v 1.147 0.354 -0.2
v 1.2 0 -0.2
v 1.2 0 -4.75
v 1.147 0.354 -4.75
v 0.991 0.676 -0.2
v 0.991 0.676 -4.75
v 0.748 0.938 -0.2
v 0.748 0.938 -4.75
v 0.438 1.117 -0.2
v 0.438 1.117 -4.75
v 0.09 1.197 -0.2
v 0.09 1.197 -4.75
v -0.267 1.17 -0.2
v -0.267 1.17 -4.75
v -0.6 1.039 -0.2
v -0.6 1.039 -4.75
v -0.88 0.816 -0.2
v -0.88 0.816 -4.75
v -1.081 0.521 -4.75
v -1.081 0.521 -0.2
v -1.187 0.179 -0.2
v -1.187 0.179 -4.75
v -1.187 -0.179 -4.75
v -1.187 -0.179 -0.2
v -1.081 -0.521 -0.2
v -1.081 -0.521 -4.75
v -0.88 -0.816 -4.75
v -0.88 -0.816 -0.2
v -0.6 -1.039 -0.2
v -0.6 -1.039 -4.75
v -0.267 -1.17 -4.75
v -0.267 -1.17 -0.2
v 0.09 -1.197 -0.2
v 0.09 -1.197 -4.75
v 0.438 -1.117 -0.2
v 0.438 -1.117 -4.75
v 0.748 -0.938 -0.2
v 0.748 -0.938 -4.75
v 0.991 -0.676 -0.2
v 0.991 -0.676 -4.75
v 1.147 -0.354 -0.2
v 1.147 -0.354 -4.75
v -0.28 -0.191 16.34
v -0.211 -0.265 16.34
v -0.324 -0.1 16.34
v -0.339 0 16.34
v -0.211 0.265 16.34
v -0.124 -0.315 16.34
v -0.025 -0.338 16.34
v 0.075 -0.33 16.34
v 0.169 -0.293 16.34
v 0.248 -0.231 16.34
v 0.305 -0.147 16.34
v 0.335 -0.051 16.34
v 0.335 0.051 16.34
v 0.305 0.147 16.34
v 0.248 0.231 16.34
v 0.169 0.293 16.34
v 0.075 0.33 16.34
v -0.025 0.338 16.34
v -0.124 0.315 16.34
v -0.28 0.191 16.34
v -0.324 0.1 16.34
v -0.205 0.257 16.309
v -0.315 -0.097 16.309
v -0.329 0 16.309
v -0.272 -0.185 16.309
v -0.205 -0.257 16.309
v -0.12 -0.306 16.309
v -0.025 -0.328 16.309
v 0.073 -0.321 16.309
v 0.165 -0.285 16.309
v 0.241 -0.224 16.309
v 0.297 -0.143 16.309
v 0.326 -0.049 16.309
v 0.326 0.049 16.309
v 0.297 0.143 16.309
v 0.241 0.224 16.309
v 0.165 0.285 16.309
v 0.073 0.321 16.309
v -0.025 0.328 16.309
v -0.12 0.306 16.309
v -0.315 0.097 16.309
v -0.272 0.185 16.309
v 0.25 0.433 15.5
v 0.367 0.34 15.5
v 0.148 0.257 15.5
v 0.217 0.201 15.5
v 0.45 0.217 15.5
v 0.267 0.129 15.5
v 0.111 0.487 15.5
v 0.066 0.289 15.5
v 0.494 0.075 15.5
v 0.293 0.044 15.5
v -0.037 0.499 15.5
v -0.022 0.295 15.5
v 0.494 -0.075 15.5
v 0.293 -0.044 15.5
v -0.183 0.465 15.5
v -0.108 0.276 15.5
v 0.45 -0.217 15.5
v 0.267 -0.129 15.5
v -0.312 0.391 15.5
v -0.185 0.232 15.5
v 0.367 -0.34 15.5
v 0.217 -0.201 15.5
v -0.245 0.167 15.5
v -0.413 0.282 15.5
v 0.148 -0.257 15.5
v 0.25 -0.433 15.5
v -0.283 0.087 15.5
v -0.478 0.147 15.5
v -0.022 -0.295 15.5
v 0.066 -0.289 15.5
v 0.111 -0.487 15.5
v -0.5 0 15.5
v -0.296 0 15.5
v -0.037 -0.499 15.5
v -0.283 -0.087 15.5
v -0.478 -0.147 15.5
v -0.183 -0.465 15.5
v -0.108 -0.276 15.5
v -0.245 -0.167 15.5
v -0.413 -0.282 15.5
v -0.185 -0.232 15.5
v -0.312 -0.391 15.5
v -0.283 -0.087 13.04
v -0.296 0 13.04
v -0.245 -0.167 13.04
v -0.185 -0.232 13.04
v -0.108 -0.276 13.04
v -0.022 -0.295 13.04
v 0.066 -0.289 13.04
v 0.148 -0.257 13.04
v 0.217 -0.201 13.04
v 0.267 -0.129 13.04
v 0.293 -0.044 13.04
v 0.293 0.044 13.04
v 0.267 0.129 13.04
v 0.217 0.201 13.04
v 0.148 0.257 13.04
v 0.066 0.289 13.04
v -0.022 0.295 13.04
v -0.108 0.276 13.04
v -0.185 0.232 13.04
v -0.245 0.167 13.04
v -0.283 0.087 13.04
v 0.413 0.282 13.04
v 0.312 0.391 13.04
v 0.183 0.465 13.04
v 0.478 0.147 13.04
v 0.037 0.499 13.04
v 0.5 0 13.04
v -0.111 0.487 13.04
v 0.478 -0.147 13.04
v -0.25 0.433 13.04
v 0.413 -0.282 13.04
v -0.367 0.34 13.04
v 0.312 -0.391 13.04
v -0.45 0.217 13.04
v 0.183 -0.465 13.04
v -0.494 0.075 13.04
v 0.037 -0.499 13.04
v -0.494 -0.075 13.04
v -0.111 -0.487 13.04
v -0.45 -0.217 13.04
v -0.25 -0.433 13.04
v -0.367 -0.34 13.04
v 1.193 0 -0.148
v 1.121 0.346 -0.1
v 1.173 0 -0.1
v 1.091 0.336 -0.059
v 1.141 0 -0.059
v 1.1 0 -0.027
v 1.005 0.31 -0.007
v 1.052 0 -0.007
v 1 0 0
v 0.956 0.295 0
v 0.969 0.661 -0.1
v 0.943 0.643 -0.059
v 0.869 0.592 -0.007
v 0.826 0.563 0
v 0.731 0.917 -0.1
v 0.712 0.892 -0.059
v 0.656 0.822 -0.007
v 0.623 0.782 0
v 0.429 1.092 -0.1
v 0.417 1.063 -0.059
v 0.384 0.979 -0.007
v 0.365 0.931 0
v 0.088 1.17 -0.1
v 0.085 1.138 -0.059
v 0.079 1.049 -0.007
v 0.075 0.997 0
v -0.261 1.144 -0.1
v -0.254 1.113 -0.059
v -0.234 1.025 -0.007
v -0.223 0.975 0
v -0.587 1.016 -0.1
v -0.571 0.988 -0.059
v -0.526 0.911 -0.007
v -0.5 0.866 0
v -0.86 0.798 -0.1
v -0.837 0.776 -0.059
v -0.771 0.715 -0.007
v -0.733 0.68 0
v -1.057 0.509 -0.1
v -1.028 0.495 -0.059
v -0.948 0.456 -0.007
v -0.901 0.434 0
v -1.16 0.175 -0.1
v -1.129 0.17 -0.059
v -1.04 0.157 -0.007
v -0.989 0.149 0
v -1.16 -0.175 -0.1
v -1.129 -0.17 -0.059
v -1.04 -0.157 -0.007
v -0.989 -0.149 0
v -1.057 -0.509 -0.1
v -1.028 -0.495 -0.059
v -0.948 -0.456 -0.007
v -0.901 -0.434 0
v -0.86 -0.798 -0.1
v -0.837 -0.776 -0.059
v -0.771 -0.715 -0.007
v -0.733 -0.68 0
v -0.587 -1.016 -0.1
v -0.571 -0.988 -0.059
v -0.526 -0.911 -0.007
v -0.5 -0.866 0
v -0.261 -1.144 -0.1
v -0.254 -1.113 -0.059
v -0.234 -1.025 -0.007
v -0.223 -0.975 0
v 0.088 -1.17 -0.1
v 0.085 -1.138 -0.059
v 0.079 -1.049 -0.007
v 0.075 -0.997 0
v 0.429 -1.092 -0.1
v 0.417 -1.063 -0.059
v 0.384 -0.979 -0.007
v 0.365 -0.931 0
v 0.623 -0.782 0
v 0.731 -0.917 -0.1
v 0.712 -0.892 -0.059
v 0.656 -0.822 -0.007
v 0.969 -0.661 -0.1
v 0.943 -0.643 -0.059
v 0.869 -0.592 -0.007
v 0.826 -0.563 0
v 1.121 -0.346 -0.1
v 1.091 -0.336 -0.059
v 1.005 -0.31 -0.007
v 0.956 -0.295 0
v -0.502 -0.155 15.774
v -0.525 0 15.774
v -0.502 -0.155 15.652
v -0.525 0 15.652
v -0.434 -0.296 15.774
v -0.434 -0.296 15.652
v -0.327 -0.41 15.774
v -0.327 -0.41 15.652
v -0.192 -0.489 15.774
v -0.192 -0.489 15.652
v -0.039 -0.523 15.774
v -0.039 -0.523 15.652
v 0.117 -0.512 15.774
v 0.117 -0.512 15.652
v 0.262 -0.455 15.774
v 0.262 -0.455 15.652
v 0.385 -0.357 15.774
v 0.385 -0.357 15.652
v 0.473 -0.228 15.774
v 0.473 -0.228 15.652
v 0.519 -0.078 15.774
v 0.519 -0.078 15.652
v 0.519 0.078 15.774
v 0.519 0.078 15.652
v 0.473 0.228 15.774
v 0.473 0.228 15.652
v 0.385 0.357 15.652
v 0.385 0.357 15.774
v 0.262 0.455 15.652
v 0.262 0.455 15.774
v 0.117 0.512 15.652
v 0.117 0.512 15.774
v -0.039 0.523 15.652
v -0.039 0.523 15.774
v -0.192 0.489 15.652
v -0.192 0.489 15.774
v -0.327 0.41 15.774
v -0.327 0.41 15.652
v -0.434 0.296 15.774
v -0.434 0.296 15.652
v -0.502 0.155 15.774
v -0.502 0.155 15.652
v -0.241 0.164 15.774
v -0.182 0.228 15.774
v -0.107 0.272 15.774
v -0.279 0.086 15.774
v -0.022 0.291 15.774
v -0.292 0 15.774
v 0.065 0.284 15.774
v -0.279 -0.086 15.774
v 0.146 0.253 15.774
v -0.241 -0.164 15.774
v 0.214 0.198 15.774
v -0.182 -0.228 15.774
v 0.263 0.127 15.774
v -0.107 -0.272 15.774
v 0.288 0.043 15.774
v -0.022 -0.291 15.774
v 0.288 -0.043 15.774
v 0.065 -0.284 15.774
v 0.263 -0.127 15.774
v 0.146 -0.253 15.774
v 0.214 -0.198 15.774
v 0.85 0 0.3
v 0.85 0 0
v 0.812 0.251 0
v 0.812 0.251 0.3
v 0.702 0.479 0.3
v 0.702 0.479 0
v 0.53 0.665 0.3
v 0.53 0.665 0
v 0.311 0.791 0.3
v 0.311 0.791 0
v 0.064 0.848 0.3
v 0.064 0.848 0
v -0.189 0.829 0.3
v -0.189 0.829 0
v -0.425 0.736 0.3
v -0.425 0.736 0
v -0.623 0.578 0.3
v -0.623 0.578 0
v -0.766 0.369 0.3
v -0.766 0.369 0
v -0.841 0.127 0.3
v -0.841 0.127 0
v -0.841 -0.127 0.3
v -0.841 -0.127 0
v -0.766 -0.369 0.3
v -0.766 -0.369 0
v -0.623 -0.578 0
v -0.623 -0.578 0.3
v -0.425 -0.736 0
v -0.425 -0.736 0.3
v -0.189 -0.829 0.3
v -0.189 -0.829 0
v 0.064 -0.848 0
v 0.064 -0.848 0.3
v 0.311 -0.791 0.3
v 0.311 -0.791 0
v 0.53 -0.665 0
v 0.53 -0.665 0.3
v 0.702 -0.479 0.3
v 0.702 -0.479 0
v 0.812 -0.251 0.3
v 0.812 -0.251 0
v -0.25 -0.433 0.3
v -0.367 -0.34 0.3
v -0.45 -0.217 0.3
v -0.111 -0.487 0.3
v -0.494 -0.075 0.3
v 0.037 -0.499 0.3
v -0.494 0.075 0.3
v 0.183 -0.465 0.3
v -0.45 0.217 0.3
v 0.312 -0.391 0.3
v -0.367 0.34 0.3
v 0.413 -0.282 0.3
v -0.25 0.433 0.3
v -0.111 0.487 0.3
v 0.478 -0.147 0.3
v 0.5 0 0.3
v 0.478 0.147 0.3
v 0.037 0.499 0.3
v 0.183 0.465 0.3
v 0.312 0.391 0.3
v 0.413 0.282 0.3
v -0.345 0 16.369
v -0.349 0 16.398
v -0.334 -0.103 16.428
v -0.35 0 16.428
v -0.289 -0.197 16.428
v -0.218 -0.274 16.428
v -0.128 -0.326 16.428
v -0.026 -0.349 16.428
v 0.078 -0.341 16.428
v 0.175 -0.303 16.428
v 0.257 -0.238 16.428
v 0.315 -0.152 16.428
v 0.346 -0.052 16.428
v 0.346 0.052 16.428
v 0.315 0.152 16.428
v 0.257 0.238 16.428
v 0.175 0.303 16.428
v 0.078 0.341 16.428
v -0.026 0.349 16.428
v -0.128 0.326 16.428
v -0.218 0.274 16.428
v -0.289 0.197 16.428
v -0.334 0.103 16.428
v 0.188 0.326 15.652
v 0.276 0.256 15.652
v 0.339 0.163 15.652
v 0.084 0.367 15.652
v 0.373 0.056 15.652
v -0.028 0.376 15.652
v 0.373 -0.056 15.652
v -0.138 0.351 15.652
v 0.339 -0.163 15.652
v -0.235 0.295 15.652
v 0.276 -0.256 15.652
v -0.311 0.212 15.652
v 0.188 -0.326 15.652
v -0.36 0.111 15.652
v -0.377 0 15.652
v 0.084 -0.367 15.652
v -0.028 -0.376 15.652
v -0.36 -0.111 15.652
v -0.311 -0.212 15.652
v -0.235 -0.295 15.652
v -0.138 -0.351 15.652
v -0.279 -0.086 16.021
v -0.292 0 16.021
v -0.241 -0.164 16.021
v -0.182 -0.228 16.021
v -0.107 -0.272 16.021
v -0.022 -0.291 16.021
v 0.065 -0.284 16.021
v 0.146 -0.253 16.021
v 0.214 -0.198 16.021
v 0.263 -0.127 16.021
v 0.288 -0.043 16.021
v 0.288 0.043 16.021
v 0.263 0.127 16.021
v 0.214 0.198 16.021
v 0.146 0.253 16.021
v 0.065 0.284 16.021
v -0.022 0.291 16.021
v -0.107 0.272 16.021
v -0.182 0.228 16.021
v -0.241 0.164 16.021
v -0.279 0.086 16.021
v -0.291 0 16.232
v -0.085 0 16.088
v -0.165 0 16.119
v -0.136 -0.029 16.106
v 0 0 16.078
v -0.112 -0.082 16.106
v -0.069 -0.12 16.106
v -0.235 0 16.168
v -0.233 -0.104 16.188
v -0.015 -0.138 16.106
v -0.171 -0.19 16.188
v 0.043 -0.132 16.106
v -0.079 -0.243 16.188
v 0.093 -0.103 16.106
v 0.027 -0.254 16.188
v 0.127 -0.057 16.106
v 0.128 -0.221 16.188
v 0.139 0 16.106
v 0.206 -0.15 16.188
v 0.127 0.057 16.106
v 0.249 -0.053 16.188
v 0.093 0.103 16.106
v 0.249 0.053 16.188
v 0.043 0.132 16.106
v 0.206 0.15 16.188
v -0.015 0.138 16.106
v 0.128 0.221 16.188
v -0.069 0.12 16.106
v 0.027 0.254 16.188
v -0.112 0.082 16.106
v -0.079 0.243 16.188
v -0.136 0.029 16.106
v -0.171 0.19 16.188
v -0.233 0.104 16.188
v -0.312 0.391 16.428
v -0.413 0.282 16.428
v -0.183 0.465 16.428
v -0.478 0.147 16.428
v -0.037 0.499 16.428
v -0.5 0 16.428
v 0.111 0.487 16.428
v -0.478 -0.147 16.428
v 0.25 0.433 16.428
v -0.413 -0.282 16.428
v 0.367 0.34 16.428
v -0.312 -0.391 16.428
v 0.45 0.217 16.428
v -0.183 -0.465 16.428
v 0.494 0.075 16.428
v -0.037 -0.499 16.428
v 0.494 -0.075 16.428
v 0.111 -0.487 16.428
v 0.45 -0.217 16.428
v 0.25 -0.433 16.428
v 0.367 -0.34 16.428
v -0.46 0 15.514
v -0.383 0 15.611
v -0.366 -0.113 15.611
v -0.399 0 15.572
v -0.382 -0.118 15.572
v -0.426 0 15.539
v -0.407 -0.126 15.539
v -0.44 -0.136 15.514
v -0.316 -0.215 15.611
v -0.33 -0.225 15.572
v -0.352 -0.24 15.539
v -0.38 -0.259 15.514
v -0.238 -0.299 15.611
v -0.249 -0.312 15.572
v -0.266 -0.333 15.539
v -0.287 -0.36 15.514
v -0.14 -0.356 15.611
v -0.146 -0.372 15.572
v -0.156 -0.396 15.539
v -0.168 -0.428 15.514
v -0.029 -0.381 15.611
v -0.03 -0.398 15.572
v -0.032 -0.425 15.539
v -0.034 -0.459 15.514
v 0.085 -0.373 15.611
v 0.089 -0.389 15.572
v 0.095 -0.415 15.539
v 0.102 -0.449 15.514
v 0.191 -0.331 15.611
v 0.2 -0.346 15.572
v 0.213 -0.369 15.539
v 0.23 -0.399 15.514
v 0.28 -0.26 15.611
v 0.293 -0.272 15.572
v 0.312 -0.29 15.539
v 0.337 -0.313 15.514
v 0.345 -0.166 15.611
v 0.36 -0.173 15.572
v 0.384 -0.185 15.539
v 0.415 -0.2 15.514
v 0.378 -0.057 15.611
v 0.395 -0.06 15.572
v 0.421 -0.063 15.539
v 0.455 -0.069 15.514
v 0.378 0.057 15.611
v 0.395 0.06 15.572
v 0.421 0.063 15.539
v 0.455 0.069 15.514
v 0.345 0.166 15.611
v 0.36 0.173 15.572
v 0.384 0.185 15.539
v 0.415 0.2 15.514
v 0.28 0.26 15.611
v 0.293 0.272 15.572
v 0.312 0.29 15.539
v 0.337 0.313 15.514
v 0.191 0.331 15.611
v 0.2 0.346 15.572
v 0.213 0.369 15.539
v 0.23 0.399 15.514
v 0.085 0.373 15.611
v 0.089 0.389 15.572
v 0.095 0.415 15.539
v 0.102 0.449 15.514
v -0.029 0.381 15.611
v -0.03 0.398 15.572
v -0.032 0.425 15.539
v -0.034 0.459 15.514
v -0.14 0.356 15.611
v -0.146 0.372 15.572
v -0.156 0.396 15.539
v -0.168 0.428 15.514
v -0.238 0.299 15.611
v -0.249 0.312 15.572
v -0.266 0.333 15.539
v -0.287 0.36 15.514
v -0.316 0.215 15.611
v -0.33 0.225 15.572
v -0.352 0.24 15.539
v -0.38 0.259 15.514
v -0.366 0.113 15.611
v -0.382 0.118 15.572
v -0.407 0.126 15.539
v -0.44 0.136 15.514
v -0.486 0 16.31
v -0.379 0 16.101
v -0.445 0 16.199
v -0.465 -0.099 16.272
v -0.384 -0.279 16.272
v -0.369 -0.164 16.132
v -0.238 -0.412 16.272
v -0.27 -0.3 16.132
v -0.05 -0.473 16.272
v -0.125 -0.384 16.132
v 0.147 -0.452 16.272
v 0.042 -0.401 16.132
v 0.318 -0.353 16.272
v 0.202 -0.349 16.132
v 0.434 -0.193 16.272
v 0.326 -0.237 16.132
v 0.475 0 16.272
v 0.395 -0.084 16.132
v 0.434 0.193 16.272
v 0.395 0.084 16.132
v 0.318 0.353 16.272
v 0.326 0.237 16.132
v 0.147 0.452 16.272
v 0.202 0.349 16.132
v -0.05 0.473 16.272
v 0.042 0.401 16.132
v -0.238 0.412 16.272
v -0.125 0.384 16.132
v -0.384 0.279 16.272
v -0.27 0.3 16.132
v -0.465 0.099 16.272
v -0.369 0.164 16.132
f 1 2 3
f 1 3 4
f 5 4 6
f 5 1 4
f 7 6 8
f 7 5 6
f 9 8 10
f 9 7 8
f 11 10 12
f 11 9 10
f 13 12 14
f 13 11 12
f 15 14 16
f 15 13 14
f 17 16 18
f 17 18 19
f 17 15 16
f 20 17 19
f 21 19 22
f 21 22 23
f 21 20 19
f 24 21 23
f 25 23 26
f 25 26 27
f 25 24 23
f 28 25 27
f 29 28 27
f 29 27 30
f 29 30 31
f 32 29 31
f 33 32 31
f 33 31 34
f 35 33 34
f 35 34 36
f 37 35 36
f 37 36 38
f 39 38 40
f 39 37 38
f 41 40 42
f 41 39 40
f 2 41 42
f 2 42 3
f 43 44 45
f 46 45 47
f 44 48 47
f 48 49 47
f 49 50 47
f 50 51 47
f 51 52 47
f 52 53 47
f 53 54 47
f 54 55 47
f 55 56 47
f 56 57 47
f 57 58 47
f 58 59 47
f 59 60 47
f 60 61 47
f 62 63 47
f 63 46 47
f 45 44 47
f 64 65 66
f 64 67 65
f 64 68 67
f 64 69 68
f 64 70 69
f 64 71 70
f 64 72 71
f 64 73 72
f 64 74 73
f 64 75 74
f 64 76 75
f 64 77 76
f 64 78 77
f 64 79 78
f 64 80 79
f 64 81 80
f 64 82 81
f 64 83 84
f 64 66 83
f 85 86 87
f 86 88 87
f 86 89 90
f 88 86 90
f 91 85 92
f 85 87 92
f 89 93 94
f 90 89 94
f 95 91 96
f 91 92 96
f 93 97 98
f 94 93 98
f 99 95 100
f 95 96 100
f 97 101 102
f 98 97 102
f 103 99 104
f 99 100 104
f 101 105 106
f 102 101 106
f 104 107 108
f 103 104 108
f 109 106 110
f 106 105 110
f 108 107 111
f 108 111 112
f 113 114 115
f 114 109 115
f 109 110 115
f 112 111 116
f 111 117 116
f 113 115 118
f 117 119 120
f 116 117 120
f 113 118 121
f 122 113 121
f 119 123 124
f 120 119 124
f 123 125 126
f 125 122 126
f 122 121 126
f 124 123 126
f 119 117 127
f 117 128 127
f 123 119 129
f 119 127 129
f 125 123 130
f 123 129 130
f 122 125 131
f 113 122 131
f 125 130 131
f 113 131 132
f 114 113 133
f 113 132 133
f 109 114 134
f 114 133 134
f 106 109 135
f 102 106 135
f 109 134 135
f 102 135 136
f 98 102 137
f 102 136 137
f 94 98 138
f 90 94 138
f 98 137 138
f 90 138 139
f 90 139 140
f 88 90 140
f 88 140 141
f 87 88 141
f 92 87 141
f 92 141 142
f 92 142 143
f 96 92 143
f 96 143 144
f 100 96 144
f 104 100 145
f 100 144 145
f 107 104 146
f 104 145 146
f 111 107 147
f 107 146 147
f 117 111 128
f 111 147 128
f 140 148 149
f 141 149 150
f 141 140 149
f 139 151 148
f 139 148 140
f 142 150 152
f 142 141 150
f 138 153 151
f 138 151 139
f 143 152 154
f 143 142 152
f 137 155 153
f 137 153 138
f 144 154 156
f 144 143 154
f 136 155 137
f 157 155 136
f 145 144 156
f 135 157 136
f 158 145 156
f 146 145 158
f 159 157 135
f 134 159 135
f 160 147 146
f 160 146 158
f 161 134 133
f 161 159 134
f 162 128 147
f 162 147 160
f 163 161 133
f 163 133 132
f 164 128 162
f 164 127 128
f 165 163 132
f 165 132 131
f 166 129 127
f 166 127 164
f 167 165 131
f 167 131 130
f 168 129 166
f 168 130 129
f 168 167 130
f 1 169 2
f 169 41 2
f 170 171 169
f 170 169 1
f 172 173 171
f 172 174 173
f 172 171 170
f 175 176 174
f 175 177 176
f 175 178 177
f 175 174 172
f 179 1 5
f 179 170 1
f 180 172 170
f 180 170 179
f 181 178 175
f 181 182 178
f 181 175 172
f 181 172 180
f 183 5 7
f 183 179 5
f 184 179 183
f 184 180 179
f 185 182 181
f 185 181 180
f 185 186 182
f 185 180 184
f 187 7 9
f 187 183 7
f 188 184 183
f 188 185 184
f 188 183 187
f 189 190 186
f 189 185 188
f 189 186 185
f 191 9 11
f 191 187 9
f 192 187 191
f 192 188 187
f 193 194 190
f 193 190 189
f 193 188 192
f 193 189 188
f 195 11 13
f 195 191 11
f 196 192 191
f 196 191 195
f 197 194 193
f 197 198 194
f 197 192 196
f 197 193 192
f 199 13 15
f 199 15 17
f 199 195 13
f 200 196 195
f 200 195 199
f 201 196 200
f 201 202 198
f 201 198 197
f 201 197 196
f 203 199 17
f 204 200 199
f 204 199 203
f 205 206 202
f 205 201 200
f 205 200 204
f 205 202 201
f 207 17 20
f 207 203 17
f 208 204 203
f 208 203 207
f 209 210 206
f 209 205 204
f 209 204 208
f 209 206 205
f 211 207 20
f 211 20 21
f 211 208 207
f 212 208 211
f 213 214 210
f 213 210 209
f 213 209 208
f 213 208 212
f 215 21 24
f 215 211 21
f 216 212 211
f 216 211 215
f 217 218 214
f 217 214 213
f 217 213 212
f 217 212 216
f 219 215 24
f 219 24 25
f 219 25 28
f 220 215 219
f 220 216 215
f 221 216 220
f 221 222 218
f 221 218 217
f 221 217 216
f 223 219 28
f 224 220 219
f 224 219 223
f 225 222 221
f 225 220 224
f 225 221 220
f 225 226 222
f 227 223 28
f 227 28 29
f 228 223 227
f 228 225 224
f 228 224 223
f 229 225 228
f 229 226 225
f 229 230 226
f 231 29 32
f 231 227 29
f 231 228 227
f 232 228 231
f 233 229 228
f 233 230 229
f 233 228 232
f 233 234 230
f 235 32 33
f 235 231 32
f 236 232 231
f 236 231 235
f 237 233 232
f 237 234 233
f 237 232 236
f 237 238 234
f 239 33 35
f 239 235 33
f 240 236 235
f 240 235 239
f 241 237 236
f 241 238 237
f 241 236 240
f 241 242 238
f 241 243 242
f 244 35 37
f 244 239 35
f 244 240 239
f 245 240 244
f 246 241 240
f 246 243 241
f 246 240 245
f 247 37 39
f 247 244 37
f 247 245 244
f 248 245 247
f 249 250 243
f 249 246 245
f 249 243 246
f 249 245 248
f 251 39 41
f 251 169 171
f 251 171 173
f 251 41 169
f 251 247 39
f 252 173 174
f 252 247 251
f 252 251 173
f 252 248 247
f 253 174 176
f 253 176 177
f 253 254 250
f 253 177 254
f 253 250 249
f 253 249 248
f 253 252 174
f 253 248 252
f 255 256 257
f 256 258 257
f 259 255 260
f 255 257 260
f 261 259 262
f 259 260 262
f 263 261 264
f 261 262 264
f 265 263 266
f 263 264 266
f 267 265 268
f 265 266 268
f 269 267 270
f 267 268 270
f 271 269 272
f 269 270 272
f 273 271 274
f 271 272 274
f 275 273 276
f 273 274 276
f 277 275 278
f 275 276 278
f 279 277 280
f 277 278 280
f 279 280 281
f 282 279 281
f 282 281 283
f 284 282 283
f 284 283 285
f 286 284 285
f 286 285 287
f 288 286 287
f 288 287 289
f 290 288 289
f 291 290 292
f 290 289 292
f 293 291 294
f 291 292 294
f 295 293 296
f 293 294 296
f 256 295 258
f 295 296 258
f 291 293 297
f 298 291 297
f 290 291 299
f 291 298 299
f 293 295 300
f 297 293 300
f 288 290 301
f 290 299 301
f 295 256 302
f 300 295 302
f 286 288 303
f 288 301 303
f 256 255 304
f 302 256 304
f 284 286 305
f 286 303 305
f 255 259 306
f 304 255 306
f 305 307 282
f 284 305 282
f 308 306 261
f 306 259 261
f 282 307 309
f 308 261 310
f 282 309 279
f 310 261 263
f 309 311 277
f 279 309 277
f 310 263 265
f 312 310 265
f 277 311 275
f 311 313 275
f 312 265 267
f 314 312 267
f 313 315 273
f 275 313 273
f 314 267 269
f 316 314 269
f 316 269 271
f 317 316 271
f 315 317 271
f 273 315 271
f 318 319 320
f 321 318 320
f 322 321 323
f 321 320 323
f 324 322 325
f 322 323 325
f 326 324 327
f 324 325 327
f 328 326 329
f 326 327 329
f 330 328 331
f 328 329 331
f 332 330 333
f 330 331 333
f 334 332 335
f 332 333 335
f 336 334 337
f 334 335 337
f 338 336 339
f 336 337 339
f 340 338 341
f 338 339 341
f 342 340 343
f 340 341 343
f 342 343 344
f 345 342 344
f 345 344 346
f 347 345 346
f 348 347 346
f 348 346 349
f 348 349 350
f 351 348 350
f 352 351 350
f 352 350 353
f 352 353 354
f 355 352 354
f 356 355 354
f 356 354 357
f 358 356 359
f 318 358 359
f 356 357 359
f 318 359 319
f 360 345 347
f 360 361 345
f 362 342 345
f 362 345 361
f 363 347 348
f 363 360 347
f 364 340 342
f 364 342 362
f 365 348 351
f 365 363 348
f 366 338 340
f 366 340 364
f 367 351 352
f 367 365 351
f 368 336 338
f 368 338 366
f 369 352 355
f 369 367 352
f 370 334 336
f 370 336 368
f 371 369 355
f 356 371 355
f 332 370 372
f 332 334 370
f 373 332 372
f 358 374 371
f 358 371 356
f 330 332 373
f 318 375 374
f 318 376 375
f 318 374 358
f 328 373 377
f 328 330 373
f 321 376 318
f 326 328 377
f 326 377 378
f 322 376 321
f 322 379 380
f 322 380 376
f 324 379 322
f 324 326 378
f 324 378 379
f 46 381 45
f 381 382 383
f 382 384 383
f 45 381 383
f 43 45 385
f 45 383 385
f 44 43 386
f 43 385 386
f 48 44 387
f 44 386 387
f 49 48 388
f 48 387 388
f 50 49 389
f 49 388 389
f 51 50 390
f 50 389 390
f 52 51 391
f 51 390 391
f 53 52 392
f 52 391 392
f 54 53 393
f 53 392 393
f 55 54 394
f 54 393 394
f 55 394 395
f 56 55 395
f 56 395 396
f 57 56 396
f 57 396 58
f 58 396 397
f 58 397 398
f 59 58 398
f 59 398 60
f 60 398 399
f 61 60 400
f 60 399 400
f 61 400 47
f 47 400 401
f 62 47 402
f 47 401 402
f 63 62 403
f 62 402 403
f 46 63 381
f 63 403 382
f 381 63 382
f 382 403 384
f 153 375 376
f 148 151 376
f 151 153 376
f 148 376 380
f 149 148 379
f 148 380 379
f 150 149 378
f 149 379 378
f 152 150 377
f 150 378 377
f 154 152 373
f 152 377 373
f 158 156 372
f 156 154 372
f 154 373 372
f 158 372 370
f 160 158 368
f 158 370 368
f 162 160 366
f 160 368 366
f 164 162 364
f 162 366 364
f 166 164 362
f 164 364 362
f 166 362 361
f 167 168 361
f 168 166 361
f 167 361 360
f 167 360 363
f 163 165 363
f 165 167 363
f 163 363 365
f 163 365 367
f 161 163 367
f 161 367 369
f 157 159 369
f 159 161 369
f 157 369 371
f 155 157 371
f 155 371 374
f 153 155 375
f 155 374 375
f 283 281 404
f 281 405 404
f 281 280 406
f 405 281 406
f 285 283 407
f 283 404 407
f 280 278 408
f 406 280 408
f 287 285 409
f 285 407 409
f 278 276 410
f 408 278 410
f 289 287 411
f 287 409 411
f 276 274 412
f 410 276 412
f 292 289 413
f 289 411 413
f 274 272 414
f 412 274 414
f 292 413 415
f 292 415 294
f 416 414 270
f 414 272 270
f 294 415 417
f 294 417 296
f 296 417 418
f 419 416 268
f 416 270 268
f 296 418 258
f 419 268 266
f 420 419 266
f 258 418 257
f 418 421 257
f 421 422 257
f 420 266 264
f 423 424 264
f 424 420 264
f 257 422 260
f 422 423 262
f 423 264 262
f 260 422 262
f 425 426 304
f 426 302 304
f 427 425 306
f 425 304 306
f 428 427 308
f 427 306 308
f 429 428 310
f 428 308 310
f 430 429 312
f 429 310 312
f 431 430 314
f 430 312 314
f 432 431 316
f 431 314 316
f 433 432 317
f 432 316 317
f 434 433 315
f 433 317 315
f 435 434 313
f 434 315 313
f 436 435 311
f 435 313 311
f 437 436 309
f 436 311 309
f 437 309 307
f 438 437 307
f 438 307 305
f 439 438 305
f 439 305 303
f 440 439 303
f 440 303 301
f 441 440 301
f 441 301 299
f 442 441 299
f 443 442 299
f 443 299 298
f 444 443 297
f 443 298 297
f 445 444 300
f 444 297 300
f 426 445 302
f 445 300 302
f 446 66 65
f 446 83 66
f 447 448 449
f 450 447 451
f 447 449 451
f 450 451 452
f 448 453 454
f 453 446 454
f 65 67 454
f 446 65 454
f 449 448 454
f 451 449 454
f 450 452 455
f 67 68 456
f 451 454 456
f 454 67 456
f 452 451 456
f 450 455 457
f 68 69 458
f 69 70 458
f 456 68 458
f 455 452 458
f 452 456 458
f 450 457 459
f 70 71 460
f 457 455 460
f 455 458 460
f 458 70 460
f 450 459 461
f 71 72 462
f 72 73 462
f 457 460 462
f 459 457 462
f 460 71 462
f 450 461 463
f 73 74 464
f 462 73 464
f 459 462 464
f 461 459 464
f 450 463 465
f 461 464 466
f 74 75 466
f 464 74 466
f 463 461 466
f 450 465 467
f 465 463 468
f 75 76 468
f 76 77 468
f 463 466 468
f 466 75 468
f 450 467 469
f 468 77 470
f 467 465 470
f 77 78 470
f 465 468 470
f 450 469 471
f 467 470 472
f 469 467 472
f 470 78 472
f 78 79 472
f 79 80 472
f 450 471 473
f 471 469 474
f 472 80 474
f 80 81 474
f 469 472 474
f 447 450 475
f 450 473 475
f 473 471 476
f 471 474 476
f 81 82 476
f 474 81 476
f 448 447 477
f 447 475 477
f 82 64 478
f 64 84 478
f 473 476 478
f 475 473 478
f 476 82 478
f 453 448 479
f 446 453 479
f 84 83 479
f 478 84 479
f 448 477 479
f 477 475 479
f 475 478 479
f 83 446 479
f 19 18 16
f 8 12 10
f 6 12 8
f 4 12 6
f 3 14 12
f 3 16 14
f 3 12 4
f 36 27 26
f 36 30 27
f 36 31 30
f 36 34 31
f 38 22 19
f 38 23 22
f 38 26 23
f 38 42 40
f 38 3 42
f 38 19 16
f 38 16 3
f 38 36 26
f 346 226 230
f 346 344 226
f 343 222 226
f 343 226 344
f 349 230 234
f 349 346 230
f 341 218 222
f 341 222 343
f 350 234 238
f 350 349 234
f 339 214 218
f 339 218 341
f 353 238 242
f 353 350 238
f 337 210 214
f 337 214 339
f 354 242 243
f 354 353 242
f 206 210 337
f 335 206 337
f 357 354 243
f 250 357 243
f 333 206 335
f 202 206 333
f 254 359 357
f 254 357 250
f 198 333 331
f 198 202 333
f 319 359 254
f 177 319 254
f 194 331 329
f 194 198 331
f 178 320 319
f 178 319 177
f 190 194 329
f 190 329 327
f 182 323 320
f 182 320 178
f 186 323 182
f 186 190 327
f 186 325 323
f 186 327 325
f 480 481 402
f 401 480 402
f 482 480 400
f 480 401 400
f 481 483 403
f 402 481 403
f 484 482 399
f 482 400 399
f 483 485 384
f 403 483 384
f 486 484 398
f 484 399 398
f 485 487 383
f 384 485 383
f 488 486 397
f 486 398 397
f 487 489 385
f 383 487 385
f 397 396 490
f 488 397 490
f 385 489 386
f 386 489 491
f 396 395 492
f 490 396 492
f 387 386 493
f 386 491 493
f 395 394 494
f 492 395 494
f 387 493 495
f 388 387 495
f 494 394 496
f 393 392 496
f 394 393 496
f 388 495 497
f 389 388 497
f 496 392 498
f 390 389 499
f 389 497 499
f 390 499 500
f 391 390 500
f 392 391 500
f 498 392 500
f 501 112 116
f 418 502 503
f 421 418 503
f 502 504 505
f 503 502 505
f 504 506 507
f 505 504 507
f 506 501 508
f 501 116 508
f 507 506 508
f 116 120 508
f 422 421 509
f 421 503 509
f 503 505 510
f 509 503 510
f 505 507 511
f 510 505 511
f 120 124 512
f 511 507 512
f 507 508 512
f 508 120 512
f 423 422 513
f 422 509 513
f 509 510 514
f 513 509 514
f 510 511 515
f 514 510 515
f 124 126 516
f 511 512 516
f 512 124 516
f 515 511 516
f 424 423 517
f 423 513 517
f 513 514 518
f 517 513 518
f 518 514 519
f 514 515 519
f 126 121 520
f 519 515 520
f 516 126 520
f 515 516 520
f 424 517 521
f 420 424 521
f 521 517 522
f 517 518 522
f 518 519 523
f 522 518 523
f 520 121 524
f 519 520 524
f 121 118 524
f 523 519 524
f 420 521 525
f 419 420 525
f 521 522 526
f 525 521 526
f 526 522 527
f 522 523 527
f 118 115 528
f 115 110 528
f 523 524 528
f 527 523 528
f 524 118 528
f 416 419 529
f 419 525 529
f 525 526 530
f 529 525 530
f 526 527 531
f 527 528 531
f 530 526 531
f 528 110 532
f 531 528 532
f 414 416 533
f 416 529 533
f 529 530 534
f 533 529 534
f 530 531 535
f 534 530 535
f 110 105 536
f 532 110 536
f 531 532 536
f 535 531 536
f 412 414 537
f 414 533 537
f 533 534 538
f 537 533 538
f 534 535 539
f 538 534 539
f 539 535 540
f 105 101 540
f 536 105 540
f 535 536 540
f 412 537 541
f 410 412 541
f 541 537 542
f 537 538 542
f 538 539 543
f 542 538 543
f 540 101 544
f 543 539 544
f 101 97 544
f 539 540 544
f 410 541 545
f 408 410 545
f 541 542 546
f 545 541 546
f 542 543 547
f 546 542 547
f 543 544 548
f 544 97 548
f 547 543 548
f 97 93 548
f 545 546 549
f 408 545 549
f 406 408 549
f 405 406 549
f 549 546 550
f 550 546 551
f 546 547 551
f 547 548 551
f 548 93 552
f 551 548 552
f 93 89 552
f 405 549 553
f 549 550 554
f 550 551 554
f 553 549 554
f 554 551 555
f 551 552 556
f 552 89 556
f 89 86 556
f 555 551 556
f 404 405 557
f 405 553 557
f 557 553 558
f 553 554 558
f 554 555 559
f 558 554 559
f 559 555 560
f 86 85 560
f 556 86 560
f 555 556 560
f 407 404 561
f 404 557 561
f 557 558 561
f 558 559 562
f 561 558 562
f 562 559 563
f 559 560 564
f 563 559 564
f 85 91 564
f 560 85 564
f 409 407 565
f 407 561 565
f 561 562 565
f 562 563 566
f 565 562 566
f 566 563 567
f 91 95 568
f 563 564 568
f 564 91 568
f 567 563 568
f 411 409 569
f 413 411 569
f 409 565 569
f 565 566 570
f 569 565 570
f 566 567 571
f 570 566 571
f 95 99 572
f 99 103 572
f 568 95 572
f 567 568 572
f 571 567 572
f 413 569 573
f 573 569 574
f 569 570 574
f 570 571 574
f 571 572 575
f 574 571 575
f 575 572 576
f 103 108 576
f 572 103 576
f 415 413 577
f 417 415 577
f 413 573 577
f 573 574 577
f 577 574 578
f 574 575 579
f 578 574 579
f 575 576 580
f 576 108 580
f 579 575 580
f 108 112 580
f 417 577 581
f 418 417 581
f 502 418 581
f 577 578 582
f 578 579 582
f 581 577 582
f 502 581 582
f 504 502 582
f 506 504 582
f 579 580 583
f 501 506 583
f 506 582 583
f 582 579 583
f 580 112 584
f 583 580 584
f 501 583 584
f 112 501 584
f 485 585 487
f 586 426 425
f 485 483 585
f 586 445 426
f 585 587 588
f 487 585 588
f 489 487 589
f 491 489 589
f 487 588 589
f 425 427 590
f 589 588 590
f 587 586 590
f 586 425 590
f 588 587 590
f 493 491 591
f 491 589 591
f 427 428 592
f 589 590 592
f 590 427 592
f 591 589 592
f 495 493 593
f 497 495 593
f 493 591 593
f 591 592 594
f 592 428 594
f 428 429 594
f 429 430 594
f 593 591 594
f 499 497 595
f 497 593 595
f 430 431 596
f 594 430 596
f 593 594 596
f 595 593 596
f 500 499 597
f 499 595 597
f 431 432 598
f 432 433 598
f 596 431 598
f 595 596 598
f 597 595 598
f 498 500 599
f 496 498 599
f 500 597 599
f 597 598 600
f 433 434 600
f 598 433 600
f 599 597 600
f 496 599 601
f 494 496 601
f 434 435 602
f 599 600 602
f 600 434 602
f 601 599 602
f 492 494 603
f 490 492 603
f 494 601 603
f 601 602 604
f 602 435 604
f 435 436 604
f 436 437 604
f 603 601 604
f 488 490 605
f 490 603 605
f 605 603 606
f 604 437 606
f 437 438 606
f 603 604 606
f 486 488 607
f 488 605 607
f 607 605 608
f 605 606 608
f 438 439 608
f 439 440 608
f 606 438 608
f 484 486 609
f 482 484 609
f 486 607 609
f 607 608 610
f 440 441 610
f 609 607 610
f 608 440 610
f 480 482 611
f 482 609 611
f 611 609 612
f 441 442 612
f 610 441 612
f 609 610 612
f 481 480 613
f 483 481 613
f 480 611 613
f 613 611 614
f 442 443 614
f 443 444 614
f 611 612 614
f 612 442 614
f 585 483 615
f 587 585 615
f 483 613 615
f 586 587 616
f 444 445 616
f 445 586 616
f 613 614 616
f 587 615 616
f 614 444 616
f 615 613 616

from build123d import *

# Parameters (mm, degrees)
SKETCH2_R           = 0.5
BOSS_EXTRUDE1_DEPTH = 15.5
SKETCH2_6_R         = 1.2
SKETCH2_6_R_2       = 0.5
BOSS_EXTRUDE3_DEPTH = 4.75
BOSS_EXTRUDE4_START = 4.75
SKETCH3_R           = 0.5
BOSS_EXTRUDE4_DEPTH = 4.75
FILLET1_R           = 0.2
SKETCH4_R           = 0.85
BOSS_EXTRUDE5_DEPTH = 0.3
SKETCH6_W           = 0.466741821
SKETCH6_H           = 0.031322261
SKETCH7_W           = 1.509947497
SKETCH7_H           = 2.46


with BuildPart() as part:
    # Sketch2 → Boss-Extrude1 (new body)
    with BuildSketch(Plane.XY):
        Circle(SKETCH2_R)
    extrude(amount=BOSS_EXTRUDE1_DEPTH)


with BuildPart() as body_2:
    # Sketch2<6> → Boss-Extrude3 (new body)
    with BuildSketch(Plane.XY):
        Circle(SKETCH2_6_R)
        Circle(SKETCH2_6_R_2, mode=Mode.SUBTRACT)
    extrude(amount=-BOSS_EXTRUDE3_DEPTH)


with BuildPart() as boss_extrude4_tool:
    # Sketch3 → Boss-Extrude4 (new body)
    with BuildSketch(Plane(origin=(0, 0, 0), x_dir=(-1, 0, 0), z_dir=(0, 0, -1)).offset(BOSS_EXTRUDE4_START)):
        Circle(SKETCH3_R)
    extrude(amount=-BOSS_EXTRUDE4_DEPTH)


with BuildPart() as part_1:
    add(part.part)


with BuildPart() as part_2:
    # Boss-Extrude4: joined with boss_extrude4_tool
    add(part_1.part.fuse(boss_extrude4_tool.part, body_2.part, tol=0.00001))

    # Fillet1
    fillet1_edges = [part_2.edges().sort_by_distance(p)[0] for p in [
        (-1.2, 0, 0),
    ]]
    fillet(fillet1_edges, radius=FILLET1_R)

    # Sketch4 → Boss-Extrude5 (add)
    with BuildSketch(Plane.XY):
        Circle(SKETCH4_R)
    extrude(amount=BOSS_EXTRUDE5_DEPTH)

    # Sketch5 → Revolve1 (revolve)
    with BuildSketch(Plane(origin=(0, 0, 0), x_dir=(1, 0, 0), z_dir=(0, 1, 0))):
        with BuildLine():
            Line((0.5, -15.5), (0, -15.5))
            Line((0, -15.5), (0, -16.0775))
            ThreePointArc((0, -16.0775), (0.247487373, -16.180012627), (0.35, -16.4275))
            Line((0.35, -16.4275), (0.5, -16.4275))
            ThreePointArc((0.5, -16.4275), (0.44489867, -16.199322057), (0.291739306, -16.021435747))
            Line((0.291739306, -16.021435747), (0.291739306, -15.774240314))
            Line((0.291739306, -15.774240314), (0.524883028, -15.774240314))
            Line((0.524883028, -15.774240314), (0.524883028, -15.652417135))
            Line((0.524883028, -15.652417135), (0.376771599, -15.652417135))
            ThreePointArc((0.376771599, -15.652417135), (0.411432347, -15.554416852), (0.5, -15.5))
        make_face()
    revolve(axis=Axis((0, 0, 15.5), (0, 0, 1)))

    # Sketch6 → Revolve2 (revolve)
    with BuildSketch(Plane(origin=(0, 0, 0), x_dir=(1, 0, 0), z_dir=(0, 1, 0))):
        with Locations((-0.233370911, -16.32433887)):
            Rectangle(SKETCH6_W, SKETCH6_H)
    revolve(axis=Axis((0, 0, 16.4275), (0, 0, -1)))

    # Sketch7 → Cut-Revolve1 (revolve, cut)
    with BuildSketch(Plane(origin=(0, 0, 0), x_dir=(1, 0, 0), z_dir=(0, 1, 0))):
        with Locations((-1.051173749, -14.27)):
            Rectangle(SKETCH7_W, SKETCH7_H)
    revolve(axis=Axis((0, 0, 15.5), (0, 0, 1)), mode=Mode.SUBTRACT)


solid = part_2.part
